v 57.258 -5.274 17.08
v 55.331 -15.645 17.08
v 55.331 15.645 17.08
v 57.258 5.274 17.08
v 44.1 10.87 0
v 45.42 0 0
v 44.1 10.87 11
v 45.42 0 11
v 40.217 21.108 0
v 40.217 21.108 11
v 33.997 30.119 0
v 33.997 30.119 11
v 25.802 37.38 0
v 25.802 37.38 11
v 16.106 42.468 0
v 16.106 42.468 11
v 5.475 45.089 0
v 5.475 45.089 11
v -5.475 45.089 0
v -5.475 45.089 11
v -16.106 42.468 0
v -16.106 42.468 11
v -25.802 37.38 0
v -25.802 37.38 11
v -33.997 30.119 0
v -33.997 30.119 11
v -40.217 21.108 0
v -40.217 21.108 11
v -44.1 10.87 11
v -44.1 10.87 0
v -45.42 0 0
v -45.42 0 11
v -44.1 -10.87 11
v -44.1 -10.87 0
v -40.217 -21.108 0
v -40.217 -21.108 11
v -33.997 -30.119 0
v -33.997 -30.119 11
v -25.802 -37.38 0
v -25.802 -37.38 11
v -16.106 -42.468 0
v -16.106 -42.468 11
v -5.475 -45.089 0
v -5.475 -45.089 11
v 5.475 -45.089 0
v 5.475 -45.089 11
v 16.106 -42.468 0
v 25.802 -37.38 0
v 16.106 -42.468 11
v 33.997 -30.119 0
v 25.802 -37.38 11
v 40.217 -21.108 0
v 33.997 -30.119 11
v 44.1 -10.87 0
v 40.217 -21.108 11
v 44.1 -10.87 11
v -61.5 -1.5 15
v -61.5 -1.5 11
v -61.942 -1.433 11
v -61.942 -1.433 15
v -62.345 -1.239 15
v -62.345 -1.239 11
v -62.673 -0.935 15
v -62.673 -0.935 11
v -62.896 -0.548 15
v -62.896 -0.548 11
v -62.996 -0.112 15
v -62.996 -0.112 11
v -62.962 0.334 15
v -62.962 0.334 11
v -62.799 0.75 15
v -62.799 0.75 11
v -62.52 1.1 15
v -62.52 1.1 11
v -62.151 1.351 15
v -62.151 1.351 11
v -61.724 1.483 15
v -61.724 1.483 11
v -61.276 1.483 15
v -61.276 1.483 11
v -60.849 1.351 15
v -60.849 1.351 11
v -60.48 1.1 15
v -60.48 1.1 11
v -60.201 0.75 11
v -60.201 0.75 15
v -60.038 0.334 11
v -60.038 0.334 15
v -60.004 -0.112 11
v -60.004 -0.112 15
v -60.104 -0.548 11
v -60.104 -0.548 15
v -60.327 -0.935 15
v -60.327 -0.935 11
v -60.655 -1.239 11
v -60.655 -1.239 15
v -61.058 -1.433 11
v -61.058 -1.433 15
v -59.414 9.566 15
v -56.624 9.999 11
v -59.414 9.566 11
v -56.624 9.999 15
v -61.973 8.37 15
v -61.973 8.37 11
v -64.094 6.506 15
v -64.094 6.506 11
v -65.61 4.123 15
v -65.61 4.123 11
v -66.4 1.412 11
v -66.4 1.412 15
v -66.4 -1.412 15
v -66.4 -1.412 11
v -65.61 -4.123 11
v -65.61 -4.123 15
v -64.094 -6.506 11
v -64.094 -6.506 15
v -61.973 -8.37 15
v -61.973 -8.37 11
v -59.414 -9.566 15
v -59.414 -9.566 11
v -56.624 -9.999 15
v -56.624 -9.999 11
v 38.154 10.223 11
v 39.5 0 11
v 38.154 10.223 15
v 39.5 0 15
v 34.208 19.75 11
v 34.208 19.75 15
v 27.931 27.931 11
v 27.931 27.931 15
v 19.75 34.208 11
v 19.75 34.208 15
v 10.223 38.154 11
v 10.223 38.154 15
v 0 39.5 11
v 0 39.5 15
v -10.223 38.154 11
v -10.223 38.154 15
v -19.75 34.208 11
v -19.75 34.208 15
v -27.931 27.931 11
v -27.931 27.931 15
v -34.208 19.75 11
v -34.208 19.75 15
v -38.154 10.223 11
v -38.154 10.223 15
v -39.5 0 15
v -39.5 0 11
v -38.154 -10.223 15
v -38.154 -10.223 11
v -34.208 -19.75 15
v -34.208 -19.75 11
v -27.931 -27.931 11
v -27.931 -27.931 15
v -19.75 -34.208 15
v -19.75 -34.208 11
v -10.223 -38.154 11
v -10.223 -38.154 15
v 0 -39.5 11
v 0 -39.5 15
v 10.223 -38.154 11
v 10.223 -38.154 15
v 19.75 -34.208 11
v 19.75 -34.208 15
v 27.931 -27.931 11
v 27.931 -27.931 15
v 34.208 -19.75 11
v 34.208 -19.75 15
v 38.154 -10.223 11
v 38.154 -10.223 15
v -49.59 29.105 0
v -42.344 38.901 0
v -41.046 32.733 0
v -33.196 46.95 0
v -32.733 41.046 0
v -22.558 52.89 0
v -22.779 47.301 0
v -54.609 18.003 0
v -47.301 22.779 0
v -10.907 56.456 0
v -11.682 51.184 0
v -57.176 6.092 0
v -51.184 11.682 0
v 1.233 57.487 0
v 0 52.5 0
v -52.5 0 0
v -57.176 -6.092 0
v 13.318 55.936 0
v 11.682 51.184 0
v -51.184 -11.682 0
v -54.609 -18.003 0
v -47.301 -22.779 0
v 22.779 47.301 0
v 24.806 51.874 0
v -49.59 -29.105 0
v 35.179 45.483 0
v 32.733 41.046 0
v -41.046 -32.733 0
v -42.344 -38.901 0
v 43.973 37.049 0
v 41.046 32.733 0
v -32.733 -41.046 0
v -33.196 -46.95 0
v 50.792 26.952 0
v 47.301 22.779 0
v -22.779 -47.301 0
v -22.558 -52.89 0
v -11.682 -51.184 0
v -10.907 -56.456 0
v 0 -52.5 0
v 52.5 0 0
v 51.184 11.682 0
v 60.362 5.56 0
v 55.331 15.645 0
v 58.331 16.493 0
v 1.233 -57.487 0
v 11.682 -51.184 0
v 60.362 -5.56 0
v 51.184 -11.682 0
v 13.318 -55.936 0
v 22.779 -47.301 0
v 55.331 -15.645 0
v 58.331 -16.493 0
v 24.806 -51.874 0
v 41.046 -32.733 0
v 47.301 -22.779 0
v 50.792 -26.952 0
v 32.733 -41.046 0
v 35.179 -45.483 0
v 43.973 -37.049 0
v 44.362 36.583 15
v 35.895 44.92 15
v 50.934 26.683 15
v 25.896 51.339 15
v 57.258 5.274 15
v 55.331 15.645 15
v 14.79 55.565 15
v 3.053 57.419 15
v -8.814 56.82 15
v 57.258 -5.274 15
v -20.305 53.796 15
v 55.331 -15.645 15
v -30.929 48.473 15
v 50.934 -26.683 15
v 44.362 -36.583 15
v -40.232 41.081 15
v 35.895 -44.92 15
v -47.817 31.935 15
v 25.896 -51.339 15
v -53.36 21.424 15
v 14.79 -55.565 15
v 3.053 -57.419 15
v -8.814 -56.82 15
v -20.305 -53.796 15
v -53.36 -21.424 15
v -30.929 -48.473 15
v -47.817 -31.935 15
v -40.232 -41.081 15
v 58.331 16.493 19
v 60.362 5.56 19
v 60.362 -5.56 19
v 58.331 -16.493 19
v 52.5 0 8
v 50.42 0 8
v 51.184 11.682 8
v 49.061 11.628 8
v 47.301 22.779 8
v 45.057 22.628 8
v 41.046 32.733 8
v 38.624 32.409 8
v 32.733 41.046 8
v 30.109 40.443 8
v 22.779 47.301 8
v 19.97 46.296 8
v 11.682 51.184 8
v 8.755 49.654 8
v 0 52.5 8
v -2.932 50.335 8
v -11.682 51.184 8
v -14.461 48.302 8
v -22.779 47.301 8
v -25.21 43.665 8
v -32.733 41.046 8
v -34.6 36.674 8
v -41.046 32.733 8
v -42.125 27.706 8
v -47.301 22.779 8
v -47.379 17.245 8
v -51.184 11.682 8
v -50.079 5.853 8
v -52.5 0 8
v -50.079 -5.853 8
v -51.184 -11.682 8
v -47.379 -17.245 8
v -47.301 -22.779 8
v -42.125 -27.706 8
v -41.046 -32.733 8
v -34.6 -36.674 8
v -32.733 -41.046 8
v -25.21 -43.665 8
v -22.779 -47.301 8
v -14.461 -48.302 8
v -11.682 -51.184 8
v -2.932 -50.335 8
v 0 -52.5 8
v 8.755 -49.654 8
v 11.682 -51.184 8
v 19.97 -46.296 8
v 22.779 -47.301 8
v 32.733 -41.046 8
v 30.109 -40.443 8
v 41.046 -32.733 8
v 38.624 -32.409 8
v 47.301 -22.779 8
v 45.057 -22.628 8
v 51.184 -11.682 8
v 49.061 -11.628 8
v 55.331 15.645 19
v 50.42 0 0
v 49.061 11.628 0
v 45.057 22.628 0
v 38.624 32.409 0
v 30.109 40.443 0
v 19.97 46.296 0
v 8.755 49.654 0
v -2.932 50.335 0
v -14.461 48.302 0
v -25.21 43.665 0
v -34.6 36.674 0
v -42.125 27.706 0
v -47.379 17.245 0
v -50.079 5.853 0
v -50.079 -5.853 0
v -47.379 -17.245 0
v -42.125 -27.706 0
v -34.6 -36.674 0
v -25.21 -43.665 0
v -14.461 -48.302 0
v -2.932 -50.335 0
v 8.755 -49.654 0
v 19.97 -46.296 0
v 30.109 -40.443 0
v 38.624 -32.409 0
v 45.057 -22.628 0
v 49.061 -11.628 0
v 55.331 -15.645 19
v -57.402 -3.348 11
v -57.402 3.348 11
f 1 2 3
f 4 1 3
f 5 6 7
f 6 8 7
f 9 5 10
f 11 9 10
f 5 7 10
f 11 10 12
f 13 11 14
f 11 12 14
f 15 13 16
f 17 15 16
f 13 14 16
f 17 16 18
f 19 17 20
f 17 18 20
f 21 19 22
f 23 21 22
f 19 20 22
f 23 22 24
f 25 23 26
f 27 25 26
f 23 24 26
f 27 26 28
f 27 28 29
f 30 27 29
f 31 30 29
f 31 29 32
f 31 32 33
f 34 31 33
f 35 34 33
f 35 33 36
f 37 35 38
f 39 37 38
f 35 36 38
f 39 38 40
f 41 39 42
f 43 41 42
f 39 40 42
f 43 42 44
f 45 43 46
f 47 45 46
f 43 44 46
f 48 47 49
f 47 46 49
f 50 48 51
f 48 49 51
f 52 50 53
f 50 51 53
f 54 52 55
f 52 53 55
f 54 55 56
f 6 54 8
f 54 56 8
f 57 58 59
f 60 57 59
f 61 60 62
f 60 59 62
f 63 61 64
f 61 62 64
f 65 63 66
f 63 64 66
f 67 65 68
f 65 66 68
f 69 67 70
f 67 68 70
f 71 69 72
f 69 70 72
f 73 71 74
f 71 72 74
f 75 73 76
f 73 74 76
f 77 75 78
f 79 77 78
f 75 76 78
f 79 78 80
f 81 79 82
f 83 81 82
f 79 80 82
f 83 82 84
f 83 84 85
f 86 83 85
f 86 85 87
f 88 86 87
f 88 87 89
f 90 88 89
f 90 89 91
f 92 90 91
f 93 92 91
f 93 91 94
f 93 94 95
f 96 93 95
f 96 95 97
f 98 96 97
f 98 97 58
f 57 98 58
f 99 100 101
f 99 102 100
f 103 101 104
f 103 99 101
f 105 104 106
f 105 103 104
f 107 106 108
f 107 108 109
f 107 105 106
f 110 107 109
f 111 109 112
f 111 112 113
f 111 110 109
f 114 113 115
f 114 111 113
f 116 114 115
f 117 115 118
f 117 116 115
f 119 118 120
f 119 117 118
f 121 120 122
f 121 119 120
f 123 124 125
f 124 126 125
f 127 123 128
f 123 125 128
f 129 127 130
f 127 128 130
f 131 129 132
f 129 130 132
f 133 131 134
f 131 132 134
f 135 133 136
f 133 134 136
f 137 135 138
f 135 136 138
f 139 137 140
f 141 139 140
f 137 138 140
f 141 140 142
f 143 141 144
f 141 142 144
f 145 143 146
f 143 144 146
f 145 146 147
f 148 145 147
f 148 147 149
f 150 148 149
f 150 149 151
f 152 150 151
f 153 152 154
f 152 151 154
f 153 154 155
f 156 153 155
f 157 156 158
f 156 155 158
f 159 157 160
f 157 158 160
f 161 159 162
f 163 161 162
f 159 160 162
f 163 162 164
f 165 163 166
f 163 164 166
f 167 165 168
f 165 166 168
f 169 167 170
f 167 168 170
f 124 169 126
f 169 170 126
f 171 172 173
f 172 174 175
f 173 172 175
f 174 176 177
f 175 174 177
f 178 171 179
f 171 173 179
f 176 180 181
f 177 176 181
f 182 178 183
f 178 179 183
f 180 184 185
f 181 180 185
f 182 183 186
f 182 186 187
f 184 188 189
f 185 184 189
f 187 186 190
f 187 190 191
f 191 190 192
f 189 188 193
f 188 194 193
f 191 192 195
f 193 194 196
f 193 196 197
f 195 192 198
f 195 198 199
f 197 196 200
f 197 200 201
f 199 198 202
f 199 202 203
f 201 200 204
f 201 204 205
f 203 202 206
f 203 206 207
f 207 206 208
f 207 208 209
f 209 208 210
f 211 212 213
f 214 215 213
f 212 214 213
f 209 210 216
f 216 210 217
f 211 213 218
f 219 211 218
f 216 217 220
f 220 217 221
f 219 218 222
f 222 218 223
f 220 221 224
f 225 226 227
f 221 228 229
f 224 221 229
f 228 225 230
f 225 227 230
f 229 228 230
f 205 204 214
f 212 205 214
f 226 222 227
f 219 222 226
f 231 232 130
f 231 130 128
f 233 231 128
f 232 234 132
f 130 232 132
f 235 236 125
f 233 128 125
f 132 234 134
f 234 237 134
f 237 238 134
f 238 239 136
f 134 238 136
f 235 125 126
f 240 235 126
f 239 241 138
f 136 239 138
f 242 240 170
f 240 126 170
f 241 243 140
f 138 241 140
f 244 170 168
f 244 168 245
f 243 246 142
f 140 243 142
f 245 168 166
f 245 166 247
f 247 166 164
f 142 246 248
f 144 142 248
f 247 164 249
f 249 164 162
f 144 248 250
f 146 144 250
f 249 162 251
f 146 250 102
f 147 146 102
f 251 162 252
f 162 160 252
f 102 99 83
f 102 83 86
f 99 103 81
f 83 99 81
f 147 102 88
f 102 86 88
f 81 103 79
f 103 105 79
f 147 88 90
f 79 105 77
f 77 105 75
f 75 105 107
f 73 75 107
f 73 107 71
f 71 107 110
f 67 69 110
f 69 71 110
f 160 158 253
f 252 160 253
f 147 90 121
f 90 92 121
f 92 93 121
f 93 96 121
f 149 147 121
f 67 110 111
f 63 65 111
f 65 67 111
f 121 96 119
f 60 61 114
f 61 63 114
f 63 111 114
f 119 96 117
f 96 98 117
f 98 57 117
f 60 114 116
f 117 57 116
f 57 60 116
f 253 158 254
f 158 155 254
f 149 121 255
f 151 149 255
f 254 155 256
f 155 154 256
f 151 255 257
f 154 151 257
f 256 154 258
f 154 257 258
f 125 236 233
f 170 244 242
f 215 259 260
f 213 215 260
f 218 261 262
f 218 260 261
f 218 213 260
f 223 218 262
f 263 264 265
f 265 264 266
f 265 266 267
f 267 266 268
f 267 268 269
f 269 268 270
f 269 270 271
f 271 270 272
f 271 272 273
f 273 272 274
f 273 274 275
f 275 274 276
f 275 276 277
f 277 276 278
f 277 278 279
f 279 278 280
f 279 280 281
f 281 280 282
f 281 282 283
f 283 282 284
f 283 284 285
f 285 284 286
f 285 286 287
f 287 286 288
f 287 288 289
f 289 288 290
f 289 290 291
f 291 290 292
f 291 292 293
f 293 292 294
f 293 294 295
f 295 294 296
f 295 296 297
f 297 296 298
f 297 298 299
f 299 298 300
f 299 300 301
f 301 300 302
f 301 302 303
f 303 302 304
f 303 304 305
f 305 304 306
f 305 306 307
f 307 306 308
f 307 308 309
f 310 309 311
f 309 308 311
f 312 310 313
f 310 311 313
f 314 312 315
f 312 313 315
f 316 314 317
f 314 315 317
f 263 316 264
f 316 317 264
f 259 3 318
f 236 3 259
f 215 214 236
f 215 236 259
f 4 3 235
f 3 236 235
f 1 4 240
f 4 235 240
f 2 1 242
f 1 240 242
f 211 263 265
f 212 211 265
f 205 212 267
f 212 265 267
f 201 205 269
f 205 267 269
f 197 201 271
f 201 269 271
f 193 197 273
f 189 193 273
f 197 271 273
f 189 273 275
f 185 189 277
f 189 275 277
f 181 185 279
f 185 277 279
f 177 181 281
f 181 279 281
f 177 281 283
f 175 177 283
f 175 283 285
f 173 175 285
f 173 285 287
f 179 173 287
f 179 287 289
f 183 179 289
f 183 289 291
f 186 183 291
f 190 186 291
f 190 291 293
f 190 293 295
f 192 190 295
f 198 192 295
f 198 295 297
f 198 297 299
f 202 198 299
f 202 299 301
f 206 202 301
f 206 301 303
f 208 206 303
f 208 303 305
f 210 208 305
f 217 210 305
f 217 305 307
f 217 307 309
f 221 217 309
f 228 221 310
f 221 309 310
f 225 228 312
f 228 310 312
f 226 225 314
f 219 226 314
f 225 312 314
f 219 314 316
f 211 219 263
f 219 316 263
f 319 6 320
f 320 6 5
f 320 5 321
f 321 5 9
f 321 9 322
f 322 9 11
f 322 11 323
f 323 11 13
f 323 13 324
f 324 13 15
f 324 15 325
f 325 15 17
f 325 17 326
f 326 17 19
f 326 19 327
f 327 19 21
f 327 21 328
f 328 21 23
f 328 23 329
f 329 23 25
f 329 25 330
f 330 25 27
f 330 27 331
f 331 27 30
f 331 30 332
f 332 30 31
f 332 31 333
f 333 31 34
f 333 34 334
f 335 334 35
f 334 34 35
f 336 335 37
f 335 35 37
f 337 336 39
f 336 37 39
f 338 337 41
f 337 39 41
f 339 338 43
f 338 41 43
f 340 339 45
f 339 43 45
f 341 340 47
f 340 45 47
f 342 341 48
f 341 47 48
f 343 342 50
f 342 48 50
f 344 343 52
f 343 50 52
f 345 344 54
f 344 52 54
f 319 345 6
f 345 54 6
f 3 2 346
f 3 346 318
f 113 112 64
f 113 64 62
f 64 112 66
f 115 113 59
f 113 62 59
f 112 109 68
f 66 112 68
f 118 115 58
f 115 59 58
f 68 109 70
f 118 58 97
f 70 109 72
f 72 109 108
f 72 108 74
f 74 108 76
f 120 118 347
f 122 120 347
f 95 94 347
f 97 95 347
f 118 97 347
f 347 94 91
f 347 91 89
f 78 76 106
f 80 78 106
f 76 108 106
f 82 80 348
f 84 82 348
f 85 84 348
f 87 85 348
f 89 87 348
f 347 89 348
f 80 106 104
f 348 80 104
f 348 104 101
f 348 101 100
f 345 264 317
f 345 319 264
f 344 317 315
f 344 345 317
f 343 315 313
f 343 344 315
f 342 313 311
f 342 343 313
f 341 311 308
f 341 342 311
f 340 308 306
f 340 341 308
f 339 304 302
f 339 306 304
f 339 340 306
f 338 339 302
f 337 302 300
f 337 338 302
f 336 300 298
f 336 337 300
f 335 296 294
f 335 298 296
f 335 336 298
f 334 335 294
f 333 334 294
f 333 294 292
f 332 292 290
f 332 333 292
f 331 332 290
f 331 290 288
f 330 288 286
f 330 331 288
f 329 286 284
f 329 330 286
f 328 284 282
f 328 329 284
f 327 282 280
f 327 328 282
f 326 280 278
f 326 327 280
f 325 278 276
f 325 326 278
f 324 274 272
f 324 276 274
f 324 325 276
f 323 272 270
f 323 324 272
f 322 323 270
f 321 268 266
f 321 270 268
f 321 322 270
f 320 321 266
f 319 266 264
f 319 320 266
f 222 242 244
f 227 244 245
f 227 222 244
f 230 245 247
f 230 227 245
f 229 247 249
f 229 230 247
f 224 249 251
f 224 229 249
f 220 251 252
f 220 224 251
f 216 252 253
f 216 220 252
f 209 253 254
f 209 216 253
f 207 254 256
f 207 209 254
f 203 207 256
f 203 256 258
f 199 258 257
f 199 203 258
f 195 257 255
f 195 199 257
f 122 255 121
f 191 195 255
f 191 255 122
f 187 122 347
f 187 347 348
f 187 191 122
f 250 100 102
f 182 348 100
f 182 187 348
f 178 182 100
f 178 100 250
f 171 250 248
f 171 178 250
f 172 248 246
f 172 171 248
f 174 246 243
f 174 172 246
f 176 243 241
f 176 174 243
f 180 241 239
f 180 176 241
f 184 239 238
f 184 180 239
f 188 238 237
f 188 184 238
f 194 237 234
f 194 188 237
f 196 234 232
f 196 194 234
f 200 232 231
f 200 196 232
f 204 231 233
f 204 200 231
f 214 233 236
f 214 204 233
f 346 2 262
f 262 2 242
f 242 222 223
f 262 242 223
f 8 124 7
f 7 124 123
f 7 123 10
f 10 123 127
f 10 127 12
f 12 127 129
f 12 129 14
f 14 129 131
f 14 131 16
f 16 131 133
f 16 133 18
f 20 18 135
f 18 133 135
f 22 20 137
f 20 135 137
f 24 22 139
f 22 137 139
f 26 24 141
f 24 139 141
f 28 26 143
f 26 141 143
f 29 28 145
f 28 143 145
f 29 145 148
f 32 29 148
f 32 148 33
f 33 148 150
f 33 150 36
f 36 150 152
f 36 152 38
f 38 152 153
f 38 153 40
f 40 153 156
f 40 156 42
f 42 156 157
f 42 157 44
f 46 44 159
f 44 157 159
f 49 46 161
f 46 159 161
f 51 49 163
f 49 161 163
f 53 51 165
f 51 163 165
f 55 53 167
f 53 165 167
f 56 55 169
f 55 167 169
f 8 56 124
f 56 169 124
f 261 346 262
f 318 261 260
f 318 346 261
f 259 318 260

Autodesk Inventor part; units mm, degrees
ref_plane "YZ Plane" through (0, 0, 0) normal (1, 0, 0) x (0, 1, 0)
ref_plane "XZ Plane" through (0, 0, 0) normal (0, 1, 0) x (-1, 0, 0)
ref_plane "XY Plane" through (0, 0, 0) normal (0, 0, 1) x (1, 0, 0)
sketch "Sketch1" plane through (0, 0, 0) normal (0, 0, 1) x (1, 0, 0)
  circle A0 centre (0, 0) radius 57.5
  dimension "d0" = 115
sketch "Sketch2" plane through (0, 0, 0) normal (1, 0, 0) x (0, 1, 0)
  line L0 (57.5, 0) -> (-57.5, 0) construction
  line L1 (-57.5, 0) -> (-57.5, 15)
  line L2 (-57.5, 15) -> (-39.5, 15)
  line L3 (-39.5, 15) -> (-39.5, 11)
  line L4 (-57.5, 0) -> (-52.5, 0)
  line L5 (-52.5, 0) -> (-52.5, 8)
  line L6 (-52.5, 8) -> (-50.42, 8)
  line L7 (-50.42, 8) -> (-50.42, 0)
  line L8 (-50.42, 0) -> (-45.42, 0)
  line L9 (-50.42, 0) -> (-45.42, 0) construction
  line L10 (-45.42, 0) -> (-45.42, 11)
  line L11 (-45.42, 11) -> (-39.5, 11)
  point P0 (0, 0)
  dimension "d1" = 15
  dimension "d3" = 4
  dimension "d4" = 90
  dimension "d5" = 5
  dimension "d6" = 8
  dimension "d7" = 2.08
  dimension "d8" = 5
  dimension "d9" = 0
  dimension "d10" = 90
  dimension "d15" = 13
sweep "Sweep1" add profiles "Sketch2" path "Sketch1"
sketch "Sketch3" plane through (0, 0, 15) normal (0, 0, 1) x (1, 0, 0)
  line L0 (56.5, 10) -> (-56.5, 10) construction
  line L1 (-56.5, 10) -> (-56.5, -10)
  line L2 (-56.5, -10) -> (56.5, -10) construction
  line L3 (56.5, -10) -> (56.5, 10)
  line L4 (56.5, 10) -> (-56.5, -10) construction
  arc A0 (-56.5, 10) -> (-56.5, -10) centre (-56.5, 0) ccw
  circle A1 centre (0, 0) radius 57.5 construction
  line L5 (-55.3308, 15.6447) -> (-55.3308, -15.6447)
  arc A2 (-55.3308, 15.6447) -> (-55.3308, -15.6447) centre (0, 0) ccw
  line L6 (0, 0) -> (-55.3308, -15.6447) construction
  line L7 (-55.3308, -15.6447) -> (-58.3308, -16.4929)
  line L8 (0, 0) -> (-55.3308, 15.6447) construction
  line L9 (-55.3308, 15.6447) -> (-58.3308, 16.4929)
  arc A3 (-58.3308, 16.4929) -> (-58.3308, -16.4929) centre (0, 0) ccw
  arc A4 (58.3308, -16.4929) -> (58.3308, 16.4929) centre (0, 0) ccw
  line L10 (55.3308, -15.6447) -> (58.3308, -16.4929)
  arc A5 (55.3308, -15.6447) -> (55.3308, 15.6447) centre (0, 0) ccw
  line L11 (55.3308, -15.6447) -> (55.3308, 15.6447)
  line L12 (55.3308, 15.6447) -> (58.3308, 16.4929)
  point P0 (-61.5, 0)
  dimension "d17" = 20
  dimension "d18" = 5
  dimension "d19" = 10
  dimension "d31" = 56.5
  dimension "d32" = 31.2894
  dimension "d33" = 3
  dimension "d34" = 3
  dimension "d37" = 360
extrude "Extrusion2" add sketch "Sketch3" against normal blind 4 contours L1 A0 A2 | A2 A0 A3 | A3 A0
hole "Hole1" at (-61.5, 0, 15) direction (0, 0, -1) diameter 3 end through all
extrude "Extrusion3" add sketch "Sketch3" along normal blind 4 and the other way blind 15 contours L10 A5 L12 A4 | L11 A5
extrude "Extrusion4" cut sketch "Sketch3" along normal blind 2.08 contours L11 A5
equation "\"d18\" = 0.5 * d19"
equation "\"d34\" = d33"
properties part number "Cap"
